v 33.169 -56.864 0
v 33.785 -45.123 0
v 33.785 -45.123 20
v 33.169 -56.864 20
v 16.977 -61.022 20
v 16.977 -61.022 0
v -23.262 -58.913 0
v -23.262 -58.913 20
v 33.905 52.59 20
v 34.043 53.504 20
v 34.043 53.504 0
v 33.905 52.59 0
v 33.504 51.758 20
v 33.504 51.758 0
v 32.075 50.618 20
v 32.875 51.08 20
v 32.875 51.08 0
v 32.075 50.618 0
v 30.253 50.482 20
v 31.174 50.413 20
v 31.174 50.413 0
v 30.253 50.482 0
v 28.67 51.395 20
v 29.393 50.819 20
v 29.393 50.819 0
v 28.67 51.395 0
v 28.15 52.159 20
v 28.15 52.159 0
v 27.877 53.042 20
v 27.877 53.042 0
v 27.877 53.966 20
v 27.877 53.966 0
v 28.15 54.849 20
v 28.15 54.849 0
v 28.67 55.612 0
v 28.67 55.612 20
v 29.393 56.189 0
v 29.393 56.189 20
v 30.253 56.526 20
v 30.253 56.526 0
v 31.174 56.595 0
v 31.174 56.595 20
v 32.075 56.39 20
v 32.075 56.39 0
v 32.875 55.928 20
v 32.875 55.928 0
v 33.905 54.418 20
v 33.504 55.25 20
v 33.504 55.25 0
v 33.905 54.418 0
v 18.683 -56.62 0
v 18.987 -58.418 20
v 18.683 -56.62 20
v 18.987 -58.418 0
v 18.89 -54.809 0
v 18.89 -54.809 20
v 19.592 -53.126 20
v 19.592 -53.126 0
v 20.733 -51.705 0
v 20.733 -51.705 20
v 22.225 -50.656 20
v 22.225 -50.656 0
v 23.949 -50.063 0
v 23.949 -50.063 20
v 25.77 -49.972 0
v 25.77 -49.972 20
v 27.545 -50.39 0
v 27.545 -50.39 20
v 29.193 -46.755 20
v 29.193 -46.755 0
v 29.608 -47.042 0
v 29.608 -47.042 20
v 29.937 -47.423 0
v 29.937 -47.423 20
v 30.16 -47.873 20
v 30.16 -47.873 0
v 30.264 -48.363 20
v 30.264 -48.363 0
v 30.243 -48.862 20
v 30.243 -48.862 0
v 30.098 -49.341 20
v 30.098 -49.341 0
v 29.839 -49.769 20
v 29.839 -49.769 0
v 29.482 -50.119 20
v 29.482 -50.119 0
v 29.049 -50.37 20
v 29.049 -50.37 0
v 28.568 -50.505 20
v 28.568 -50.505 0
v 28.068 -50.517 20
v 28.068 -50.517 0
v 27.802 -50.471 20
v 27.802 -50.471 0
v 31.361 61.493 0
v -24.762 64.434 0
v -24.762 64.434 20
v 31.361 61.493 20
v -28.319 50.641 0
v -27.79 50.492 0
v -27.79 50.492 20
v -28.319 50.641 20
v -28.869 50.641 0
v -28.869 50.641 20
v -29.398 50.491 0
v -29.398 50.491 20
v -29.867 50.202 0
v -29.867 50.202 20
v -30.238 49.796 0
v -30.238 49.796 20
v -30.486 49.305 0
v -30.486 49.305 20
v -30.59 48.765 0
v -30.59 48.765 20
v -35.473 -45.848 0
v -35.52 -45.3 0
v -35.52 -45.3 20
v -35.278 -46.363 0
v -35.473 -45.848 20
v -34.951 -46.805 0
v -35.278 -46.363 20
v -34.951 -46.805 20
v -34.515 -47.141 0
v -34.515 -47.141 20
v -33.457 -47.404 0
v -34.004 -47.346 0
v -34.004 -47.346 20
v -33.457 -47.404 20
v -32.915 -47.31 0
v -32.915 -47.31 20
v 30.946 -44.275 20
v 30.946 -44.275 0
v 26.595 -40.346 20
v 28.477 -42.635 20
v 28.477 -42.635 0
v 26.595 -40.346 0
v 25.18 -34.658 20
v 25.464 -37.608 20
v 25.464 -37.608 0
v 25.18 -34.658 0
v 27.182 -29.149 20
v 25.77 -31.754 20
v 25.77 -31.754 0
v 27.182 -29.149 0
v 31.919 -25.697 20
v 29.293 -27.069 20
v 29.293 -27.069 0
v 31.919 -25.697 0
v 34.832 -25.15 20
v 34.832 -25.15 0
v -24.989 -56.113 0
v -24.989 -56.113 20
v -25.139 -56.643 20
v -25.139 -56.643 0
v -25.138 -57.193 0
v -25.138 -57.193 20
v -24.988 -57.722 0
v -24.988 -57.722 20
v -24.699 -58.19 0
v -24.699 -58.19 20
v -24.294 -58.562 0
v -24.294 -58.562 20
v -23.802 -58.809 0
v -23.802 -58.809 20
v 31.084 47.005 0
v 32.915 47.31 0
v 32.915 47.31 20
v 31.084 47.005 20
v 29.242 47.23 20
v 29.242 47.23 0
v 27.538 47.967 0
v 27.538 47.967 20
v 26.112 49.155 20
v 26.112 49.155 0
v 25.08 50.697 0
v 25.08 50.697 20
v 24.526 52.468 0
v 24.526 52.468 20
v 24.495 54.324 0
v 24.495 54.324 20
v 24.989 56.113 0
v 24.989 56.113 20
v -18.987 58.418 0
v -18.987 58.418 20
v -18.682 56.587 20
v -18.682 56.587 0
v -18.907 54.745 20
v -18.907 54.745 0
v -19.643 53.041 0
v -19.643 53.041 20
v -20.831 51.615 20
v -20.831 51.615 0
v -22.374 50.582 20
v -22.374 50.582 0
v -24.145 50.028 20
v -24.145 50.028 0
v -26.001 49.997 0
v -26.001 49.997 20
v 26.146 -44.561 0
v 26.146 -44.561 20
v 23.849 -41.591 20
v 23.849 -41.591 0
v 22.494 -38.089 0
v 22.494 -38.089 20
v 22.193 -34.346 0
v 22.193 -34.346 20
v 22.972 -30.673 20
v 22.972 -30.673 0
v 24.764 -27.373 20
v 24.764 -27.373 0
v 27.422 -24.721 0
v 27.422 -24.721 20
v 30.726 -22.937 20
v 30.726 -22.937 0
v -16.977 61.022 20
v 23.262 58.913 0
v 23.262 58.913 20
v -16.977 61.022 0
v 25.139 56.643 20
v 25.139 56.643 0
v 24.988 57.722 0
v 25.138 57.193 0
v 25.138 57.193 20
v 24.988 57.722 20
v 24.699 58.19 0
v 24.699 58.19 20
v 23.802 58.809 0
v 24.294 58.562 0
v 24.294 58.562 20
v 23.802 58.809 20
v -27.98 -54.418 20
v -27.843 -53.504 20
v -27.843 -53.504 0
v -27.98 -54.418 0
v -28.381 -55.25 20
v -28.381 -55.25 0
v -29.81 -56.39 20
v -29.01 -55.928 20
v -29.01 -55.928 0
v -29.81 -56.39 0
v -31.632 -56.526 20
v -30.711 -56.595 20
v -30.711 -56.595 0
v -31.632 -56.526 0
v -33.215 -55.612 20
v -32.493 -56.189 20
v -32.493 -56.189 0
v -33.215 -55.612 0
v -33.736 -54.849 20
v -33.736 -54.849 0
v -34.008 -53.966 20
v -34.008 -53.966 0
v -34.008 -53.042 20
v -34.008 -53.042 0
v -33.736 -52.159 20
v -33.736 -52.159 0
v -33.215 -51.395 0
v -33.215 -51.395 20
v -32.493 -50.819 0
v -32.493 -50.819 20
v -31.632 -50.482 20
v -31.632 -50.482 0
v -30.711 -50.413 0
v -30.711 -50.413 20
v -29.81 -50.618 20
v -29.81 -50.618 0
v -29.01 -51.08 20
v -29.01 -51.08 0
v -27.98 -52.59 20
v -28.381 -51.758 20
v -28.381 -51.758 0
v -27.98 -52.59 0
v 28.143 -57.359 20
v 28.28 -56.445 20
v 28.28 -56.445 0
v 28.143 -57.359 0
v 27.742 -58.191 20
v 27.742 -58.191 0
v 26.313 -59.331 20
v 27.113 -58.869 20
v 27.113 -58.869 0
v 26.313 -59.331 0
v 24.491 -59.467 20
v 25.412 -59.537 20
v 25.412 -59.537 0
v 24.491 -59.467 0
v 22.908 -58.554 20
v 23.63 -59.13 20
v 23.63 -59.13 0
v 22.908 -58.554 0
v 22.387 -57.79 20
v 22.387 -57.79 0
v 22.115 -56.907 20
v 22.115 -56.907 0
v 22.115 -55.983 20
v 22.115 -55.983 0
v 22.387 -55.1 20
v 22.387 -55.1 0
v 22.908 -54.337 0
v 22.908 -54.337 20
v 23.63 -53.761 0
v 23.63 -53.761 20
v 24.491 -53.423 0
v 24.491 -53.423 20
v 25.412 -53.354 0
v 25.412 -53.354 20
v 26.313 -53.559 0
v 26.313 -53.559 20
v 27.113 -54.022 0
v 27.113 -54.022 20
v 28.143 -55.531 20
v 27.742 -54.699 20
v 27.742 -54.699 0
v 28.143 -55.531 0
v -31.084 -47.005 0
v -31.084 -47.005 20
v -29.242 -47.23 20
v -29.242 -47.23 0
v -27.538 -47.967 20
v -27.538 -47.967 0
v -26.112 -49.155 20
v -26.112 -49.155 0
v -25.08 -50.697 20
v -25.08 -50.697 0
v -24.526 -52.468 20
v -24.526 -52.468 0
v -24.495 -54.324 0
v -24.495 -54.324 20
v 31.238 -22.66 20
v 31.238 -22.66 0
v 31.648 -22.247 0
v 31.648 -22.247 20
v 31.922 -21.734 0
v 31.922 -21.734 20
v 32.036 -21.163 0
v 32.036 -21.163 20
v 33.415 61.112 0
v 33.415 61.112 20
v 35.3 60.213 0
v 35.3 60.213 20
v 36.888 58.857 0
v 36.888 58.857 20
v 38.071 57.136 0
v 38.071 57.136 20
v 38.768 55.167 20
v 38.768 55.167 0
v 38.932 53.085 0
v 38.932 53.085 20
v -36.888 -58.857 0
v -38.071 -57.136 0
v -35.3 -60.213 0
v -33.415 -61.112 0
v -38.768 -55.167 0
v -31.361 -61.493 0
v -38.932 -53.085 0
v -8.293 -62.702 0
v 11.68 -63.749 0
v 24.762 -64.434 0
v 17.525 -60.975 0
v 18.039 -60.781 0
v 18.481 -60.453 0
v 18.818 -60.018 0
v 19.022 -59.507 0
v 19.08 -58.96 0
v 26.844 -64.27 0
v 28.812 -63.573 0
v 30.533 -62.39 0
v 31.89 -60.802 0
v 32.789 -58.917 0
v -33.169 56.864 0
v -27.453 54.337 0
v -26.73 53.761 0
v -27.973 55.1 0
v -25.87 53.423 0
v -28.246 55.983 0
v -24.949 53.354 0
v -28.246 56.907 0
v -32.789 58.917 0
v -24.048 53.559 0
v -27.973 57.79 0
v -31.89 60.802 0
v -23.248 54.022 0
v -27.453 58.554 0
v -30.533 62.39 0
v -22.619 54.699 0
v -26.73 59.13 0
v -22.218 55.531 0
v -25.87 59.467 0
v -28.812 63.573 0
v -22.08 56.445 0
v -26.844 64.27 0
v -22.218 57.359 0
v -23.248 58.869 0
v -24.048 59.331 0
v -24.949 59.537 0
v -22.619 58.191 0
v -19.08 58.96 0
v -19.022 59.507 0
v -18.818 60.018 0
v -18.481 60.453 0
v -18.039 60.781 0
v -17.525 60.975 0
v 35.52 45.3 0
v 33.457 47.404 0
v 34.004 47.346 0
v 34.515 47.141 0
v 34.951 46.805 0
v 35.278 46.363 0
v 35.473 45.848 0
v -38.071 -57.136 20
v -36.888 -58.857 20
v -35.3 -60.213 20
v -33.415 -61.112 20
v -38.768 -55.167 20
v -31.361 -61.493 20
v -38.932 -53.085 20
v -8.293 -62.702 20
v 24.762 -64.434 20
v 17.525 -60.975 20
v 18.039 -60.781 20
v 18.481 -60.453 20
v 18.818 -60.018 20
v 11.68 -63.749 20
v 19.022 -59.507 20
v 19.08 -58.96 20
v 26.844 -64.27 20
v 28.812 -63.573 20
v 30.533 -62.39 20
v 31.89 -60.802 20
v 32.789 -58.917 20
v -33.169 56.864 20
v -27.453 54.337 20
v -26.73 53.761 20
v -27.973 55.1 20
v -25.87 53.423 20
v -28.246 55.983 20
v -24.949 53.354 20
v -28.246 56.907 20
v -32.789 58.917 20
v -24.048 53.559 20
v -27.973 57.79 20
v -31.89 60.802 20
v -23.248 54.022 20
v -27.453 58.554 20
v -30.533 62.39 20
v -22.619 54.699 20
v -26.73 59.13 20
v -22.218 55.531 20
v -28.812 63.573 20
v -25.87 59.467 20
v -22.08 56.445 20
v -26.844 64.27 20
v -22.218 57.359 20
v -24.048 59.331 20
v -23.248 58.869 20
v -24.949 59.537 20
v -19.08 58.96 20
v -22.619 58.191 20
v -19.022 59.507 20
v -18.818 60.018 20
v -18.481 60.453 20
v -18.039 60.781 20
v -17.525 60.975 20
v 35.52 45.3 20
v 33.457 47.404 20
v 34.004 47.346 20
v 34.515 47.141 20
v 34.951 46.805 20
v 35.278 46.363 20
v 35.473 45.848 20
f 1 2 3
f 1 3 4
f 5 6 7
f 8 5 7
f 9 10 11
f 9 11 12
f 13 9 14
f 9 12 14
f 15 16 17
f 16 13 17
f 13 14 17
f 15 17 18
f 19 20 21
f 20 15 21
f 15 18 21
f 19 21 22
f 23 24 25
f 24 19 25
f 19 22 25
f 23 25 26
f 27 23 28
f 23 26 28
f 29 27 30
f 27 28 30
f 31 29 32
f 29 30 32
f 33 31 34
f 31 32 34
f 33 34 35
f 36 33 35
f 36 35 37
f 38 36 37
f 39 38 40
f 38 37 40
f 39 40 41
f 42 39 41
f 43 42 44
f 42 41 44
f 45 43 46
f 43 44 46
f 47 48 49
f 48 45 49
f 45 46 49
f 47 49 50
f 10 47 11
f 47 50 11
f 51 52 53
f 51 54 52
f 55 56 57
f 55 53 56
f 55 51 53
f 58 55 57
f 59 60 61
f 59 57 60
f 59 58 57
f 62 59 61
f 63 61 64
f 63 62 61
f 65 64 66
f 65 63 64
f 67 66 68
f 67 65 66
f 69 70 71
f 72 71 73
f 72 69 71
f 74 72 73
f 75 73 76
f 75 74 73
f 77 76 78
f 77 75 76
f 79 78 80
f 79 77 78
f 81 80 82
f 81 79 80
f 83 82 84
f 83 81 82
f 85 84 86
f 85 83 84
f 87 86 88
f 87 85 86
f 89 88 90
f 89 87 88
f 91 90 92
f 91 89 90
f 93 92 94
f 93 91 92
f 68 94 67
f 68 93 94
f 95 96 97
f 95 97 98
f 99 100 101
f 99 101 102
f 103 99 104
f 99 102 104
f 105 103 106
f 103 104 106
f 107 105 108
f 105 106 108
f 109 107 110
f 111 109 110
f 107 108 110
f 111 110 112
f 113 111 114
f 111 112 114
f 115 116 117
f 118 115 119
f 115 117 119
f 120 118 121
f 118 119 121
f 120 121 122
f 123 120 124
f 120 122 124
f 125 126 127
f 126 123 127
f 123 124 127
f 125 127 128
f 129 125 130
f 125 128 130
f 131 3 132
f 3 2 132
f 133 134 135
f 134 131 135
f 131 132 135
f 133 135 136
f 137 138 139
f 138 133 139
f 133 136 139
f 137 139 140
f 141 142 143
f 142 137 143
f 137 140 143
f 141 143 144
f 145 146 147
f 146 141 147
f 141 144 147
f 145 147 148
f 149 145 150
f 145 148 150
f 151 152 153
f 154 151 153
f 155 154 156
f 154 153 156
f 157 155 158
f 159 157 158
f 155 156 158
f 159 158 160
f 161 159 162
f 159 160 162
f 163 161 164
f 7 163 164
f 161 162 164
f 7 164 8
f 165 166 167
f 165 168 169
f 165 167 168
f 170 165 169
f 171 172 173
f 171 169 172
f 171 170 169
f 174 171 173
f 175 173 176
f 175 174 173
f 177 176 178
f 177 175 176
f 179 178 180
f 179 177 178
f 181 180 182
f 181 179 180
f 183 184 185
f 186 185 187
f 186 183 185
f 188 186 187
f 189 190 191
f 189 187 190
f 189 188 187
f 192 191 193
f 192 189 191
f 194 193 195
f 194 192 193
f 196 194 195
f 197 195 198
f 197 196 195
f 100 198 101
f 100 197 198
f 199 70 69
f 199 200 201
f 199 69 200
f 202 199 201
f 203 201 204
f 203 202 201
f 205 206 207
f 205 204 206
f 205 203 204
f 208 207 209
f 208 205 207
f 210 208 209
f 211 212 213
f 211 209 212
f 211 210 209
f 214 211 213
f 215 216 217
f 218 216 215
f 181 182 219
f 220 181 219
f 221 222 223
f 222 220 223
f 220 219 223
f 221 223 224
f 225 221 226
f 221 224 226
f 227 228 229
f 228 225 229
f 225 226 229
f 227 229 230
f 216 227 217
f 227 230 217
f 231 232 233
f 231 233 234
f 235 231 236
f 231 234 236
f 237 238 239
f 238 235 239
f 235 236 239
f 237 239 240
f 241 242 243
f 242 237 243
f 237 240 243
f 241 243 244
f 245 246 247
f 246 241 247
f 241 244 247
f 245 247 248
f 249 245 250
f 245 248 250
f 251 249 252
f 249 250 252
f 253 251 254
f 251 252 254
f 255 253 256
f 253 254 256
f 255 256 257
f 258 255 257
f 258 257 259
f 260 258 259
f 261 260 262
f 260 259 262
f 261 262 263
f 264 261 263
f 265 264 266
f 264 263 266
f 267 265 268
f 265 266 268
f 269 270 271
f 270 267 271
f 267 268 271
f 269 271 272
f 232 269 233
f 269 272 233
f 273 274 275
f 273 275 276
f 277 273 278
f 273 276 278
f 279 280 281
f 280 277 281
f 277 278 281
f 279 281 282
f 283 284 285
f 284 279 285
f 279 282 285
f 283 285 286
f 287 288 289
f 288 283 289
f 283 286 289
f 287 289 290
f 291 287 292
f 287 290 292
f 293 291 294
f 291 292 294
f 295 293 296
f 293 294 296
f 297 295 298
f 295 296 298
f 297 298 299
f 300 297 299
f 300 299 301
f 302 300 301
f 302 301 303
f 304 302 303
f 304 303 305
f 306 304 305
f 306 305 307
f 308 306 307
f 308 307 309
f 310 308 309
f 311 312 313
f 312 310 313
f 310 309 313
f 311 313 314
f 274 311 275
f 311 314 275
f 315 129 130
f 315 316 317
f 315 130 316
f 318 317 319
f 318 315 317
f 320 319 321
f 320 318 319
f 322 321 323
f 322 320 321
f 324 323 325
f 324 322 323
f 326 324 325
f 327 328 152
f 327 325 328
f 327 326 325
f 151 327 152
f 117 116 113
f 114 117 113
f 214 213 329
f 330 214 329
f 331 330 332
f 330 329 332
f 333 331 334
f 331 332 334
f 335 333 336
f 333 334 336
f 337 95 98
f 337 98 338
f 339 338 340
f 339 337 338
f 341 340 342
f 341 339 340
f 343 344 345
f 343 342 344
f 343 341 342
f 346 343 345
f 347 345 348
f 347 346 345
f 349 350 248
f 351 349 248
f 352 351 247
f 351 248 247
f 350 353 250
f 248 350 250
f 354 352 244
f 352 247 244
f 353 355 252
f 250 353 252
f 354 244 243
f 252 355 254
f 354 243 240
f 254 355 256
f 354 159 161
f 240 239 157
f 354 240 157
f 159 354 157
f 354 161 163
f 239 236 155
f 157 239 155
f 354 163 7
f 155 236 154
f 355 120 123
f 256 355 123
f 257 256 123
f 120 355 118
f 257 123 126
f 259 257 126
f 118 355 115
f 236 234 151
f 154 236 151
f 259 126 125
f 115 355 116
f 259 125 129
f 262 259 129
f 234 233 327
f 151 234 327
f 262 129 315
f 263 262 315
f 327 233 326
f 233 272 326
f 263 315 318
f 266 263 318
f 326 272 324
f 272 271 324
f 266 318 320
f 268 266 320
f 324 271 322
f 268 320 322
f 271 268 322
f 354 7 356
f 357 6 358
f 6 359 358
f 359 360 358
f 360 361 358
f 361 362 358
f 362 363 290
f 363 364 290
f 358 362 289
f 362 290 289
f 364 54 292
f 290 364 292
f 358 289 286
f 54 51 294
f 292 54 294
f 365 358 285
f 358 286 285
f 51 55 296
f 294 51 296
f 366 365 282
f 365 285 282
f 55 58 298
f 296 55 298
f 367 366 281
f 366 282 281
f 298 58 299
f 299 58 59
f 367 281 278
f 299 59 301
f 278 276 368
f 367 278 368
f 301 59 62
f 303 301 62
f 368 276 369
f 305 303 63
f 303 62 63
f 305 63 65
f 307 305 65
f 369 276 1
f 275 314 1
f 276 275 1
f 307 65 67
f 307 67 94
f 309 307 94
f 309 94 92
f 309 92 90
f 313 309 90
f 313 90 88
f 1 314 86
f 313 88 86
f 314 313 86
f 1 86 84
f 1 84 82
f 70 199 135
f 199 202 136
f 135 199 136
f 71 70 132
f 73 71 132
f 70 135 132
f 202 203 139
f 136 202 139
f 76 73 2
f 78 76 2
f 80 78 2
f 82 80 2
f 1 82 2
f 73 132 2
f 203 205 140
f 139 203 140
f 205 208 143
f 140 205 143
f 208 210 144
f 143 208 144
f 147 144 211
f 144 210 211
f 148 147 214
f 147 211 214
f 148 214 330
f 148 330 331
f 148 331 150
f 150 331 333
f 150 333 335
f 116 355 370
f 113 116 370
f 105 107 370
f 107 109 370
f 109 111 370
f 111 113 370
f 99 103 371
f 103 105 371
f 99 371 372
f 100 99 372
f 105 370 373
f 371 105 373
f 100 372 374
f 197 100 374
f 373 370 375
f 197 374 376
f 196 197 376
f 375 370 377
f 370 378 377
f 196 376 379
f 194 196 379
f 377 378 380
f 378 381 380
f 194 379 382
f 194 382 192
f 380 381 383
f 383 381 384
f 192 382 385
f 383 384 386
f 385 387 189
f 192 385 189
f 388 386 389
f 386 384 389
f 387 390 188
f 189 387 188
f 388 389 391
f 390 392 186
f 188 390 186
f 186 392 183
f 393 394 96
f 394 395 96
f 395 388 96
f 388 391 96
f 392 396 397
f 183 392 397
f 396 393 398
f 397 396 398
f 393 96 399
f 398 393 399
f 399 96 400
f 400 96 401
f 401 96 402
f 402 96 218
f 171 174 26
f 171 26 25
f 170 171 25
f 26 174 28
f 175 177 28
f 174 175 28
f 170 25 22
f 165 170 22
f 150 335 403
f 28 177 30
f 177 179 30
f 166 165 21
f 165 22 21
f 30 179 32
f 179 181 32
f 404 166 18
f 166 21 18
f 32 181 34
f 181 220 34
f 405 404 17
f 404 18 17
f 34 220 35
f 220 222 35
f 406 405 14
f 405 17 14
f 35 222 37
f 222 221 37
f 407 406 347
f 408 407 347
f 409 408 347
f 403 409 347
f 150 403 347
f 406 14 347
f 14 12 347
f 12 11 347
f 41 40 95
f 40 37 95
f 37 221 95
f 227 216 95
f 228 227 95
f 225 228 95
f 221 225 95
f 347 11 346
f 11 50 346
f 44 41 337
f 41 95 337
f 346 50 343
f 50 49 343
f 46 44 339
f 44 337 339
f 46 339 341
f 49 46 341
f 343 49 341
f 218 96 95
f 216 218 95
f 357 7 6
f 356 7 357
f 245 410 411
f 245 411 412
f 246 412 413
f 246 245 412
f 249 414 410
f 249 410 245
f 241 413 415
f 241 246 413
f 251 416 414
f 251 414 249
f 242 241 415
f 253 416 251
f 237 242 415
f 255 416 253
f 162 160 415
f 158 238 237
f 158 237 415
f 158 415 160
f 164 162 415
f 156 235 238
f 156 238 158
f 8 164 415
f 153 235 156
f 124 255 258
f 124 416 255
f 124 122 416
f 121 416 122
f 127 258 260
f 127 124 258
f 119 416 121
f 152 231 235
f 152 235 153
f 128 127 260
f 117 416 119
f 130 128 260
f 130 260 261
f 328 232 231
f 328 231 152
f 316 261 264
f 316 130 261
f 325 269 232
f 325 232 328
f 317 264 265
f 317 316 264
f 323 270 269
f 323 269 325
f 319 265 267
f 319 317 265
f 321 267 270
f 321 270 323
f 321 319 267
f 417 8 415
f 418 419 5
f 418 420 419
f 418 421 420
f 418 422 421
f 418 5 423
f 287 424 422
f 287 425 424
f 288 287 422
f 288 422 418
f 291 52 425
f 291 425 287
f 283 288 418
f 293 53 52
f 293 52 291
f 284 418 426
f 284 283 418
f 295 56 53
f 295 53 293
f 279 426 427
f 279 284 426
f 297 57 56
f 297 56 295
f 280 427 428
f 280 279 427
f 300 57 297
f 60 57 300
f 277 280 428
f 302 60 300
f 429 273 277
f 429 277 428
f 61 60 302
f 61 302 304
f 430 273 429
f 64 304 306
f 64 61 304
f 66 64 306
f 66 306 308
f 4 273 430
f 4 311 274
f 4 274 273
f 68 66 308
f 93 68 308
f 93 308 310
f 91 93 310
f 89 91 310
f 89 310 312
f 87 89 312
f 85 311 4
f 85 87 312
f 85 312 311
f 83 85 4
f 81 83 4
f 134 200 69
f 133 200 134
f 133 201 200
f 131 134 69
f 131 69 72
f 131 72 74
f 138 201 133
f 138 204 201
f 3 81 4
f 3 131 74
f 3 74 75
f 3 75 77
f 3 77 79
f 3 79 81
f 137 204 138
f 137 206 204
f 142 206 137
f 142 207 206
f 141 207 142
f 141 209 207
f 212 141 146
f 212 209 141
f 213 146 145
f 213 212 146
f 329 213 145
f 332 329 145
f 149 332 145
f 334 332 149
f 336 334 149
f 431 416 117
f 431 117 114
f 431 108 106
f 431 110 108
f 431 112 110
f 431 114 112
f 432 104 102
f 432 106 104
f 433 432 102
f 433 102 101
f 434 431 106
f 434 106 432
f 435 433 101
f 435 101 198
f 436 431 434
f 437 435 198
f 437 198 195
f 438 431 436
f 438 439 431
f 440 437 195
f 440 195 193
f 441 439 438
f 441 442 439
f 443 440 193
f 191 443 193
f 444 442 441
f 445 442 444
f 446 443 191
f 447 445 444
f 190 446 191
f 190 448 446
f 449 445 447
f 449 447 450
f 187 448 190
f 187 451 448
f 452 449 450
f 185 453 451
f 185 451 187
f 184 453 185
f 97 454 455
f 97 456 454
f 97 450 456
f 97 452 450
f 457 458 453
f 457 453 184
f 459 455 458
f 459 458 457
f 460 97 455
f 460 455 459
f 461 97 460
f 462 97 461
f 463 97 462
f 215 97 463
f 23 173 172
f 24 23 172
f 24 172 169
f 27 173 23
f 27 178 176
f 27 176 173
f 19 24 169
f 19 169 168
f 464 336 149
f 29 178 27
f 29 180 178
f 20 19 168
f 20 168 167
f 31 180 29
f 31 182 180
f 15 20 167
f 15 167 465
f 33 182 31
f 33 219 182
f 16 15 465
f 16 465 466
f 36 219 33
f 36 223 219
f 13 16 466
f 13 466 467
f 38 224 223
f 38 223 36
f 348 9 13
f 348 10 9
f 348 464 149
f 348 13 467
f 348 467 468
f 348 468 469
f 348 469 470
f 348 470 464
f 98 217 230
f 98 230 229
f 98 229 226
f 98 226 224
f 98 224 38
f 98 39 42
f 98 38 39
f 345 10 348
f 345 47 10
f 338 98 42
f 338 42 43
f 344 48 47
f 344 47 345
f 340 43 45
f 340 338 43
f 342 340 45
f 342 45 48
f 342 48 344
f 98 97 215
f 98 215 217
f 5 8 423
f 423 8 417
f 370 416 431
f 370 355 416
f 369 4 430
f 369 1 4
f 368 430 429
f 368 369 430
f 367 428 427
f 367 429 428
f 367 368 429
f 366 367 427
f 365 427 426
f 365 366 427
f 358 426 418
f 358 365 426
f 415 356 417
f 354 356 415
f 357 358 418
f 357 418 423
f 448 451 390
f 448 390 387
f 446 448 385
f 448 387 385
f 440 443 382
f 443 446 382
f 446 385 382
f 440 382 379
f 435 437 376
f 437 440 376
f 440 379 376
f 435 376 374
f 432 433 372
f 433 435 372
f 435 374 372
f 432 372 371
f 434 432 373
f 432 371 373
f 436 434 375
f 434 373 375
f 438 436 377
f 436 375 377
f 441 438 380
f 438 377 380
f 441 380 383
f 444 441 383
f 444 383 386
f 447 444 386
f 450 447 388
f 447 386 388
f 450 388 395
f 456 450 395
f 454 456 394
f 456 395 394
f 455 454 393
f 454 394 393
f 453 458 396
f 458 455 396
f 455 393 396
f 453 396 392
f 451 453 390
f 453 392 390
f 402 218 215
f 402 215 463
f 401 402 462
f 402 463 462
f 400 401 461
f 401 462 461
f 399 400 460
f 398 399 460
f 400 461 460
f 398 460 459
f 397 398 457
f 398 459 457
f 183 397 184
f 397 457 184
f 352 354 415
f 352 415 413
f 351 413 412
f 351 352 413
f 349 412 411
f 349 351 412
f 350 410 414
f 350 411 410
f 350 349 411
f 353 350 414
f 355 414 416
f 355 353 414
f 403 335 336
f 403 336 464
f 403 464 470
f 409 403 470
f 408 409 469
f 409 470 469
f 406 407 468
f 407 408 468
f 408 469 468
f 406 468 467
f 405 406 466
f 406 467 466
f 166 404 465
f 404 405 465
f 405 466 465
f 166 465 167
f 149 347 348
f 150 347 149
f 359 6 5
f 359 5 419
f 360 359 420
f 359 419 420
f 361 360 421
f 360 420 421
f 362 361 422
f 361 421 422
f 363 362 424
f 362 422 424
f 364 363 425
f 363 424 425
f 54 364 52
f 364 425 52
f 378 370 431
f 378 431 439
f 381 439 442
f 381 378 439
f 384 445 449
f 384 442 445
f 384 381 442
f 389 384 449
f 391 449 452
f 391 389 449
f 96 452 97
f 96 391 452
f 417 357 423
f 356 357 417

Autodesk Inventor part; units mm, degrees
ref_plane "YZ Plane" through (0, 0, 0) normal (1, 0, 0) x (0, 1, 0)
ref_plane "XZ Plane" through (0, 0, 0) normal (0, 1, 0) x (-1, 0, 0)
ref_plane "РабПлоскость1" through (0, 0, 0) normal (0, 0, 1) x (1, 0, 0)
sketch "Эскиз1" plane through (0, 0, 0) normal (0, 0, 1) x (1, 0, 0)
  circle A0 centre (-30.9426, -53.5039) radius 3 construction
  circle A1 centre (25.1804, -56.4452) radius 3 construction
  circle A2 centre (-25.1804, 56.4452) radius 3 construction
  circle A3 centre (30.9426, 53.5039) radius 3 construction
  circle A4 centre (-30.9426, -53.5039) radius 3.1
  circle A5 centre (25.1804, -56.4452) radius 3.1
  circle A6 centre (30.9426, 53.5039) radius 3.1
  circle A7 centre (-25.1804, 56.4452) radius 3.1
  line L0 (38.9316, 53.0852) -> (34.8315, -25.15)
  arc A8 (38.9316, 53.0852) -> (31.3613, 61.493) centre (30.9426, 53.5039) ccw
  line L1 (-24.7617, 64.4342) -> (31.3613, 61.493)
  arc A9 (-24.7617, 64.4342) -> (-33.1694, 56.8639) centre (-25.1804, 56.4452) ccw
  line L2 (-38.9316, -53.0852) -> (-33.1694, 56.8639)
  arc A10 (-38.9316, -53.0852) -> (-31.3613, -61.493) centre (-30.9426, -53.5039) ccw
  line L3 (-8.2929, -62.7019) -> (-31.3613, -61.493)
  line L4 (24.7617, -64.4342) -> (11.6797, -63.7486)
  arc A11 (24.7617, -64.4342) -> (33.1694, -56.8639) centre (25.1804, -56.4452) ccw
  line L5 (33.7848, -45.1226) -> (33.1694, -56.8639)
  line L6 (11.6797, -63.7486) -> (-8.2929, -62.7019)
  arc A12 (34.8315, -25.15) -> (33.7848, -45.1226) centre (35.2069, -35.1834) ccw
  circle A13 centre (35.2069, -35.1834) radius 4 construction
  arc A14 (34.989, -22.1448) -> (33.6273, -48.1278) centre (35.2069, -35.1834) ccw
  line L7 (31.9635, -22.5528) -> (35.7184, 49.0946)
  circle A15 centre (30.9426, 53.5039) radius 6.5
  circle A16 centre (-25.1804, 56.4452) radius 6.5
  circle A17 centre (25.1804, -56.4452) radius 6.5
  circle A18 centre (-30.9426, -53.5039) radius 6.5
  line L8 (27.0566, 58.7144) -> (-20.7711, 61.221)
  line L9 (30.3909, -52.5593) -> (30.661, -47.4059)
  line L10 (20.7711, -61.221) -> (-27.0566, -58.7144)
  line L11 (-35.7184, -49.0946) -> (-30.3909, 52.5593)
  point P0 (0, 0)
  dimension "d2" = 6.2
  dimension "d6" = 6
  dimension "d9" = 6.2
  dimension "d10" = 6.2
  dimension "d11" = 6.2
  dimension "d12" = 10.0404
  dimension "d13" = 13.0404
  dimension "d14" = 3
  dimension "d15" = 13
  dimension "d16" = 3
  dimension "d17" = 3
  dimension "d18" = 3
  dimension "d19" = 3
ref_plane "РабПлоскость2" through (-53.0981, -74.1022, 20) normal (0, 0, -1) x (0.2079, 0.9781, 0)
extrude "Выдавливание1" add sketch "Эскиз1" along normal up to surface (20 mm away) contours L0 A14 L7 A15 L8 A16 L11 A18 L10 A17 L9 L5 A11 L4 L6 L3 A10 L2 A9 L1 A8 | L0 A12 L5 A14 | A15 | A17 | A16 | A18
fillet "Сопряжение1" radius 2 10 edges at (20.7711, -61.221, 10) (30.3909, -52.5593, 10) (-35.7184, -49.0946, 10) (-27.0566, -58.7144, 10) (27.0566, 58.7144, 10) (35.7184, 49.0946, 10) (-20.7711, 61.221, 10) (-30.3909, 52.5593, 10) (31.9635, -22.5528, 10) (30.661, -47.4059, 10)
equation "\"d9\" = d2"
equation "\"d10\" = d2"
equation "\"d11\" = d2"
properties part number "Стойка" material "Сталь нержавеющая, 440C"
